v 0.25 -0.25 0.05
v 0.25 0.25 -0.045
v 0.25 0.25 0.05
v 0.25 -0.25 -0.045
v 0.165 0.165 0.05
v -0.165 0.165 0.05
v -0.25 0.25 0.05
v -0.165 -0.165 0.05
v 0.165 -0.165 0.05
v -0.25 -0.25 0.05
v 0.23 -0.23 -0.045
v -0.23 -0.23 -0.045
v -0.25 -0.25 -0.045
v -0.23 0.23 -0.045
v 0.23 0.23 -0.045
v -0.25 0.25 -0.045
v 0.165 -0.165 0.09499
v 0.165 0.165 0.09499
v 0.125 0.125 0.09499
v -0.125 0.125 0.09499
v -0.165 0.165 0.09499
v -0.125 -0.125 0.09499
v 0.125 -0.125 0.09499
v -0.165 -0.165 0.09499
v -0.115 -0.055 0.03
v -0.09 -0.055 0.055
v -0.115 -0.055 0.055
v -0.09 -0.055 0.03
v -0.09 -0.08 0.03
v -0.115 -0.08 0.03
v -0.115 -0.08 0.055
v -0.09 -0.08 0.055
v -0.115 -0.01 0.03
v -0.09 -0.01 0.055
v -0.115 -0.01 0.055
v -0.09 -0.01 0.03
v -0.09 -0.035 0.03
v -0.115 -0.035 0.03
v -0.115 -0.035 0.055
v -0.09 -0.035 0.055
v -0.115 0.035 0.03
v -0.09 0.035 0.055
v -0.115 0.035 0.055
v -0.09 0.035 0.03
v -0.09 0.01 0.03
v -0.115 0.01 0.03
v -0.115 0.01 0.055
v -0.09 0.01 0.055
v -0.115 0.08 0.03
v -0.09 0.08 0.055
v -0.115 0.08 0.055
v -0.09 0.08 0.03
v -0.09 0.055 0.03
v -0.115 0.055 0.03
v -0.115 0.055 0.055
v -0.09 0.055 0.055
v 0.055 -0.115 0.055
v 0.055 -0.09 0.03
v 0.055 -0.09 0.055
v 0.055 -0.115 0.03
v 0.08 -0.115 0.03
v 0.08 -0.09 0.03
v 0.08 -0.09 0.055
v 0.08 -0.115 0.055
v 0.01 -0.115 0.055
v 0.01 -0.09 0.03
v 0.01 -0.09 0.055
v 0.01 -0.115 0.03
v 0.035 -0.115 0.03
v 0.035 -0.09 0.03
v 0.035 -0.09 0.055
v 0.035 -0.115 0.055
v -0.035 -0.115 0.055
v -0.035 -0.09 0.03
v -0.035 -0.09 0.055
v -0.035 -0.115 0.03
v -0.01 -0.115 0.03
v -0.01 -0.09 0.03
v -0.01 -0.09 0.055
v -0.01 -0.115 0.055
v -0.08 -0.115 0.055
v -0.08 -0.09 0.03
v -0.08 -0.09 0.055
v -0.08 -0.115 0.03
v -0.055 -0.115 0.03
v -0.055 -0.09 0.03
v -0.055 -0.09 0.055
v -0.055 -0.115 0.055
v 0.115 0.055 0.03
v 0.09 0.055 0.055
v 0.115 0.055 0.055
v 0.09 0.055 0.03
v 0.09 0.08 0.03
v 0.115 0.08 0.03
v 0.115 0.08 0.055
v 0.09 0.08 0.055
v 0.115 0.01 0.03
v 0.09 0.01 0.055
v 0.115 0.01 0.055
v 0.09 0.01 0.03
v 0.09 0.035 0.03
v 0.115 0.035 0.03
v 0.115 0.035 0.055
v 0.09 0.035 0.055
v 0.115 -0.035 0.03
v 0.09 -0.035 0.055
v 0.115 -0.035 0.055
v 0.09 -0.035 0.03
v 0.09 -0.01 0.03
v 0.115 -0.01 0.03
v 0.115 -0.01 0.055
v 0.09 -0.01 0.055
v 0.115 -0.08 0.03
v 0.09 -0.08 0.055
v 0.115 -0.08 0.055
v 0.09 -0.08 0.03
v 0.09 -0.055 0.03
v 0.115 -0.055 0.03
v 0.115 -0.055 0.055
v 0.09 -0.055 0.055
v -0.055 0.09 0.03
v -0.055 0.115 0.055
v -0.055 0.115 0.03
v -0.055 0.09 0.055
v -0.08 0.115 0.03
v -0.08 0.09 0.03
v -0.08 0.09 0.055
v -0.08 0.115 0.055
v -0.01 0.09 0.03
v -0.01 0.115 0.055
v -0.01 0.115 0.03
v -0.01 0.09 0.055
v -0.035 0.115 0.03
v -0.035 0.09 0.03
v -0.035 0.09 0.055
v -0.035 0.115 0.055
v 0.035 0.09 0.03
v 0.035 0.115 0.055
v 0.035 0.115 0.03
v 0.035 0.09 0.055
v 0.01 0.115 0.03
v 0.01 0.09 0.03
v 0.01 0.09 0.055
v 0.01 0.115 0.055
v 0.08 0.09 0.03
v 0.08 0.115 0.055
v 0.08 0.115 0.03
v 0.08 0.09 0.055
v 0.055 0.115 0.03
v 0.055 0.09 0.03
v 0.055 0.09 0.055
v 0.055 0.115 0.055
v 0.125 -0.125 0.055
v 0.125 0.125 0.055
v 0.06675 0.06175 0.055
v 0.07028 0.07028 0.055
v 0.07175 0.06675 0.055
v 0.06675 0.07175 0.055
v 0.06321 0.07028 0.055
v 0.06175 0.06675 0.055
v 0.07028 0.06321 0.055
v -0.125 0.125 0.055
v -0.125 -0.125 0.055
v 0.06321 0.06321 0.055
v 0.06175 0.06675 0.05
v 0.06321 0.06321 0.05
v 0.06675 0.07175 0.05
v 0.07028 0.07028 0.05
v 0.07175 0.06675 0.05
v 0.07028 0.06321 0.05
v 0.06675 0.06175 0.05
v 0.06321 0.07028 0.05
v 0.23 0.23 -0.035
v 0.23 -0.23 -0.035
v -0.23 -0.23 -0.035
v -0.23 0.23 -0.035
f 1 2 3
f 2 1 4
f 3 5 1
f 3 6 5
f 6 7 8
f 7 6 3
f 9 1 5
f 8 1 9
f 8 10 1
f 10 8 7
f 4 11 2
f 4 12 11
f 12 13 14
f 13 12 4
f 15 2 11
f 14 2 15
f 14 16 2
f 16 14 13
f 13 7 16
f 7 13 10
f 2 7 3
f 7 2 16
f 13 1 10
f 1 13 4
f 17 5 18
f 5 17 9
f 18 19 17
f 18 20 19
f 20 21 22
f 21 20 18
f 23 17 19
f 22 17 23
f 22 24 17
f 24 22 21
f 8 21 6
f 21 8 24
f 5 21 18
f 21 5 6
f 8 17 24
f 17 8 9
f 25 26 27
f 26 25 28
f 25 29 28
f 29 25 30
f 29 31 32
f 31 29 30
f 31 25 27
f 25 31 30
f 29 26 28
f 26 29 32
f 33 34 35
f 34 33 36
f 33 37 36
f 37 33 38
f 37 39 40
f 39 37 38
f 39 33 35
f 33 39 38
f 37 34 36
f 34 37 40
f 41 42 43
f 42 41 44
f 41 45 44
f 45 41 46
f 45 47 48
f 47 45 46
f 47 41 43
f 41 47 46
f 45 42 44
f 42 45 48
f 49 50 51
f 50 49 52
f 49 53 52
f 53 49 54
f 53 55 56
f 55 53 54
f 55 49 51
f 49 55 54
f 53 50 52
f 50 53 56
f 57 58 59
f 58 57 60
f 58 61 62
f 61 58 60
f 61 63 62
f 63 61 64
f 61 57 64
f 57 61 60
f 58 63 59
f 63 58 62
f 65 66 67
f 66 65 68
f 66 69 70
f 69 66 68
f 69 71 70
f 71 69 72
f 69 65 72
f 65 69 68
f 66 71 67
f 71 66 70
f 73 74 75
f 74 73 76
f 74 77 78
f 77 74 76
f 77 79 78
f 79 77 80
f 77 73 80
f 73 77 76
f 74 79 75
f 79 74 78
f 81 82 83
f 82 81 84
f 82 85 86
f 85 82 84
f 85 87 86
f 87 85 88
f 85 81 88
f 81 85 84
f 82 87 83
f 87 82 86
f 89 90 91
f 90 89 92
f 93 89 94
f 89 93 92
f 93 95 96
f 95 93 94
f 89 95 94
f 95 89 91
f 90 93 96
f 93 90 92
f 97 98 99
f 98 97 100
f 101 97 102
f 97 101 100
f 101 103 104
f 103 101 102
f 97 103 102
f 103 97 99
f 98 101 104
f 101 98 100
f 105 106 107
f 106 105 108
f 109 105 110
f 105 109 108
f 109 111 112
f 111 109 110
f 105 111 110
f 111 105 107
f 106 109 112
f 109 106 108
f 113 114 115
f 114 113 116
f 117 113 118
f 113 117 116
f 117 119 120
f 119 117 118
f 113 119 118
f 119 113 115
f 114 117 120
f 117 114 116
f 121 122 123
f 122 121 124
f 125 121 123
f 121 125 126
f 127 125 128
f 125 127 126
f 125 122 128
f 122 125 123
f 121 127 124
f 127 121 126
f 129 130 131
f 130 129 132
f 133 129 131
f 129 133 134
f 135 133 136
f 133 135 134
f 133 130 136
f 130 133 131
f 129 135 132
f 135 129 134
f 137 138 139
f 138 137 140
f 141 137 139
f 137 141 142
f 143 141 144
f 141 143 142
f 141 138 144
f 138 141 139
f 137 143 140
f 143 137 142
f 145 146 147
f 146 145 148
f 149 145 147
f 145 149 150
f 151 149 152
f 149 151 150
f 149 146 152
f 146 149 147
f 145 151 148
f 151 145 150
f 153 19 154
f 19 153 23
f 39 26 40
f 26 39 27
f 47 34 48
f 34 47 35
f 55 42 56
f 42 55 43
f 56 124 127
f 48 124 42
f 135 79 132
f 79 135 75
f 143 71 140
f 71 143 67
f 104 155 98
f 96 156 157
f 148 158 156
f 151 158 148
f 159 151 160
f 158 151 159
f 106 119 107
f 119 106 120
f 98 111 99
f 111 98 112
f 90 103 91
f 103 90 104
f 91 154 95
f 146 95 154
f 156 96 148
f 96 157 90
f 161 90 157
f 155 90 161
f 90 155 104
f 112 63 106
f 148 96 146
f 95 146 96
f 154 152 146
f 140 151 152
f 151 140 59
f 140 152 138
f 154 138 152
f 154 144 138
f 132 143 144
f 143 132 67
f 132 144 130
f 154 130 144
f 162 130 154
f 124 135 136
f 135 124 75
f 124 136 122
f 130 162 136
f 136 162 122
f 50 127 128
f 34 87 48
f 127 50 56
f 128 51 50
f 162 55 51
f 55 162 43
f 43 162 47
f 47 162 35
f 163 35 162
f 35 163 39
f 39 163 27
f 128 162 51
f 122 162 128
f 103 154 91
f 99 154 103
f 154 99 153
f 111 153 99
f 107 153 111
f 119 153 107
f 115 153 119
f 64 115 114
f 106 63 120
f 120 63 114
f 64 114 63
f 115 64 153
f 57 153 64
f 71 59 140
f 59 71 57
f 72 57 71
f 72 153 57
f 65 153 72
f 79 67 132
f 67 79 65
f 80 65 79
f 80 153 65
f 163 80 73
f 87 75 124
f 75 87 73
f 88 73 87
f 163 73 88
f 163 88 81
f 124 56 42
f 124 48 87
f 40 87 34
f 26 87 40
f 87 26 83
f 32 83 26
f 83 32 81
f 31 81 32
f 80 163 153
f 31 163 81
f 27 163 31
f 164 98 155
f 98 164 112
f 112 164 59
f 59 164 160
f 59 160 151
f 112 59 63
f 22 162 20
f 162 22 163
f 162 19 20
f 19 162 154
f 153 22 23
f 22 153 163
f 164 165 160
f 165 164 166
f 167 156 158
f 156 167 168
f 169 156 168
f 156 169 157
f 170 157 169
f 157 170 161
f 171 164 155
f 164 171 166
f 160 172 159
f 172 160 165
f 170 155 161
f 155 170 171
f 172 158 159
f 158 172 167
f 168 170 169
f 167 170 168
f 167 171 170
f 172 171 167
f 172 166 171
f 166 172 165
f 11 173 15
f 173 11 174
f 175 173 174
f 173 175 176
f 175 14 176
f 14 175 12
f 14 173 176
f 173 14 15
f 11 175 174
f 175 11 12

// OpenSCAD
// file: DataSymbol.scad
boxSize = 0.029;
lineSize = 0.0045;
symDepth = 0.01;
vertSeparation = 0.019;
horizSeparation = 0.018;

module DataSymbol() {
  boxVertCenter = (boxSize+vertSeparation)/2;
  boxHorizCenter = (boxSize+horizSeparation)/2;
  linear_extrude(symDepth, center=true) {
    translate([0,boxVertCenter]) square(boxSize, center=true); // top box
    translate([-boxHorizCenter,-boxVertCenter]) square(boxSize, center=true); // bottom left box
    translate([boxHorizCenter,-boxVertCenter]) square(boxSize, center=true); // bottom right box
    square([2*boxHorizCenter + lineSize, lineSize], center=true); // middle line
    translate([0, horizSeparation/4]) square([lineSize, horizSeparation/2 + lineSize], center=true); // line to top
    translate([-boxHorizCenter, -horizSeparation/4]) square([lineSize, horizSeparation/2 + lineSize], center=true); // line to bottom left
    translate([boxHorizCenter, -horizSeparation/4]) square([lineSize, horizSeparation/2 + lineSize], center=true); // line to bottom right
  }
}

DataSymbol();
// file: PowerSymbol.scad
symWidth = 0.038;
symHeight = 0.086;
symDepth = 0.01;
middleHeight = 0.0075;
topHorizOffset = 0.007;
sideVertOffset = 0.007;

module PowerSymbol() {
  linear_extrude(symDepth, center=true) {
    halfHei = symHeight/2;
    halfWid = symWidth/2;
    halfMid = middleHeight/2;
    polygon([
      [topHorizOffset, halfHei],
      [0, halfMid],
      [halfWid, sideVertOffset],
      [-topHorizOffset, -halfHei],
      [0, -halfMid],
      [-halfWid, -sideVertOffset]
    ]);
  }
}

PowerSymbol();
// file: FPGAHousing_paintcap.scad
include <FPGA_shared.scad>;
use <FPGAHousing_base.scad>;

module FPGAHousing_paintcap() {
  bevelDepth = capBevel * sqrt(2);
  difference() {
    translate([0,0,baseTop]) {
      cube(size=[capSize, capSize, capDepth*2], center=true);
    }
    cube(size=[slotSize+eps*10, slotSize+eps*10, smallGridSize], center=true);
    for (edge=[1:4]) rotate([0,0,90*edge]) {
      translate([0,capSize/2,baseTop+capDepth]) rotate([45,0,0])
        cube(size=[capSize+0.1, bevelDepth, bevelDepth*2], center=true);
    }
  }
}

%FPGAHousing_base();
FPGAHousing_paintcap();
// file: FPGA_shared.scad
smallGridSize = 0.5;
baseSize = smallGridSize;
baseTop = 0.05;
baseBottom = -0.045;
baseDepth = baseTop - baseBottom;
baseCenter = (baseTop + baseBottom)/2;
baseBackRim = 0.02;
baseBackCutoutSize = baseSize - baseBackRim*2;
baseBackCutoutDepth = 0.01;
capSize = 0.41;
capDepth = 0.045;
capBevel = 0.01;
slotSize = smallGridSize * 0.5;
slotBottom = 0.03;
slotPinEdgeCount = 4;
slotPinEdgePad = 0.01;
slotPinEdgeSpacing = 0.045;
slotPinSize = 0.025;
slotPinDepth = 0.025;
eps = 0.00001;
chipTotalSize = slotSize - slotPinEdgePad*2 - slotPinSize/2;
chipTotalHeight = 0.1;
chipBaseHeight = 0.05;
pinHorizLength = 0.022;
pinHorizUnderLength = 0.008;
pinHorizWidth = 0.02;
pinHorizHeight = 0.015;
pinVertInnerOffset = 0.003;
pinVertOuterOffset = 0.003;
pinVertNarrowOffset = 0.003;
pinTotalHeight = chipTotalHeight - chipBaseHeight/2 + pinHorizHeight/2;
chipBaseSize = chipTotalSize - pinHorizLength*2;
chipBaseBevelSize = 0.005;
alignHoleRadius = 0.005;
alignHoleOffset = chipBaseSize/2 - 0.02;
alignHoleDepth = 0.005;
alignHoleSides = 8;
decoPinCount = 8;
decoPinWidth = 0.036;
decoPinLength = 0.034;
decoPinHeight = 0.028;
decoPinSpacing = 0.049;
decoPinBevelSize = 0.010;

module cablecutout() {
  cableradius = 0.025;
  cableDepth = 0.0125;
  translate([0,smallGridSize/2,0]) rotate([90,0,0]) {
    cylinder(h=cableDepth*2, r=cableradius, center=true, $fn=8);
  }
}
// main file
include <FPGA_shared.scad>;
use <FPGAHousing_paintcap.scad>;
use <PowerSymbol.scad>;
use <DataSymbol.scad>;

module FPGAHousing_chipcutout() {
  slotPinBaseOffset = (-slotPinEdgeCount-1)/2 * slotPinEdgeSpacing;
  slotPinEdgeOffset = slotSize/2 - slotPinSize/2 - slotPinEdgePad;
  union() {
    translate([0, 0, baseDepth/2 + slotBottom + slotPinDepth]) {
      cube(size=[slotSize, slotSize, baseDepth], center=true);
    }
    for(edge=[1:4]) rotate([0,0,90*edge]) {
      for(i=[1:slotPinEdgeCount]) {
        translate([
          slotPinBaseOffset + slotPinEdgeSpacing*i,
          slotPinEdgeOffset,
          slotBottom + slotPinDepth
        ]) {
          cube(size=[slotPinSize, slotPinSize, slotPinDepth*2], center=true);
        }
      }
    }
    translate([alignHoleOffset,alignHoleOffset,slotBottom + slotPinDepth])
      cylinder(h=alignHoleDepth*2, r=alignHoleRadius, center=true, $fn=alignHoleSides);
  }
}

module FPGAHousing_base() {
  middleSize = (slotSize + capSize) / 2;
  difference() {
    union() {
      translate([0,0,baseCenter])
        cube(size=[baseSize, baseSize, baseDepth], center=true);
      translate([0,0,baseTop-eps])
        cube(size=[middleSize, middleSize, capDepth*2], center=true);
    }
    translate([0,0,baseBottom])
      cube(size=[baseBackCutoutSize, baseBackCutoutSize, baseBackCutoutDepth*2], center=true);
    FPGAHousing_chipcutout();
  }
}

FPGAHousing_base();
%FPGAHousing_paintcap();
